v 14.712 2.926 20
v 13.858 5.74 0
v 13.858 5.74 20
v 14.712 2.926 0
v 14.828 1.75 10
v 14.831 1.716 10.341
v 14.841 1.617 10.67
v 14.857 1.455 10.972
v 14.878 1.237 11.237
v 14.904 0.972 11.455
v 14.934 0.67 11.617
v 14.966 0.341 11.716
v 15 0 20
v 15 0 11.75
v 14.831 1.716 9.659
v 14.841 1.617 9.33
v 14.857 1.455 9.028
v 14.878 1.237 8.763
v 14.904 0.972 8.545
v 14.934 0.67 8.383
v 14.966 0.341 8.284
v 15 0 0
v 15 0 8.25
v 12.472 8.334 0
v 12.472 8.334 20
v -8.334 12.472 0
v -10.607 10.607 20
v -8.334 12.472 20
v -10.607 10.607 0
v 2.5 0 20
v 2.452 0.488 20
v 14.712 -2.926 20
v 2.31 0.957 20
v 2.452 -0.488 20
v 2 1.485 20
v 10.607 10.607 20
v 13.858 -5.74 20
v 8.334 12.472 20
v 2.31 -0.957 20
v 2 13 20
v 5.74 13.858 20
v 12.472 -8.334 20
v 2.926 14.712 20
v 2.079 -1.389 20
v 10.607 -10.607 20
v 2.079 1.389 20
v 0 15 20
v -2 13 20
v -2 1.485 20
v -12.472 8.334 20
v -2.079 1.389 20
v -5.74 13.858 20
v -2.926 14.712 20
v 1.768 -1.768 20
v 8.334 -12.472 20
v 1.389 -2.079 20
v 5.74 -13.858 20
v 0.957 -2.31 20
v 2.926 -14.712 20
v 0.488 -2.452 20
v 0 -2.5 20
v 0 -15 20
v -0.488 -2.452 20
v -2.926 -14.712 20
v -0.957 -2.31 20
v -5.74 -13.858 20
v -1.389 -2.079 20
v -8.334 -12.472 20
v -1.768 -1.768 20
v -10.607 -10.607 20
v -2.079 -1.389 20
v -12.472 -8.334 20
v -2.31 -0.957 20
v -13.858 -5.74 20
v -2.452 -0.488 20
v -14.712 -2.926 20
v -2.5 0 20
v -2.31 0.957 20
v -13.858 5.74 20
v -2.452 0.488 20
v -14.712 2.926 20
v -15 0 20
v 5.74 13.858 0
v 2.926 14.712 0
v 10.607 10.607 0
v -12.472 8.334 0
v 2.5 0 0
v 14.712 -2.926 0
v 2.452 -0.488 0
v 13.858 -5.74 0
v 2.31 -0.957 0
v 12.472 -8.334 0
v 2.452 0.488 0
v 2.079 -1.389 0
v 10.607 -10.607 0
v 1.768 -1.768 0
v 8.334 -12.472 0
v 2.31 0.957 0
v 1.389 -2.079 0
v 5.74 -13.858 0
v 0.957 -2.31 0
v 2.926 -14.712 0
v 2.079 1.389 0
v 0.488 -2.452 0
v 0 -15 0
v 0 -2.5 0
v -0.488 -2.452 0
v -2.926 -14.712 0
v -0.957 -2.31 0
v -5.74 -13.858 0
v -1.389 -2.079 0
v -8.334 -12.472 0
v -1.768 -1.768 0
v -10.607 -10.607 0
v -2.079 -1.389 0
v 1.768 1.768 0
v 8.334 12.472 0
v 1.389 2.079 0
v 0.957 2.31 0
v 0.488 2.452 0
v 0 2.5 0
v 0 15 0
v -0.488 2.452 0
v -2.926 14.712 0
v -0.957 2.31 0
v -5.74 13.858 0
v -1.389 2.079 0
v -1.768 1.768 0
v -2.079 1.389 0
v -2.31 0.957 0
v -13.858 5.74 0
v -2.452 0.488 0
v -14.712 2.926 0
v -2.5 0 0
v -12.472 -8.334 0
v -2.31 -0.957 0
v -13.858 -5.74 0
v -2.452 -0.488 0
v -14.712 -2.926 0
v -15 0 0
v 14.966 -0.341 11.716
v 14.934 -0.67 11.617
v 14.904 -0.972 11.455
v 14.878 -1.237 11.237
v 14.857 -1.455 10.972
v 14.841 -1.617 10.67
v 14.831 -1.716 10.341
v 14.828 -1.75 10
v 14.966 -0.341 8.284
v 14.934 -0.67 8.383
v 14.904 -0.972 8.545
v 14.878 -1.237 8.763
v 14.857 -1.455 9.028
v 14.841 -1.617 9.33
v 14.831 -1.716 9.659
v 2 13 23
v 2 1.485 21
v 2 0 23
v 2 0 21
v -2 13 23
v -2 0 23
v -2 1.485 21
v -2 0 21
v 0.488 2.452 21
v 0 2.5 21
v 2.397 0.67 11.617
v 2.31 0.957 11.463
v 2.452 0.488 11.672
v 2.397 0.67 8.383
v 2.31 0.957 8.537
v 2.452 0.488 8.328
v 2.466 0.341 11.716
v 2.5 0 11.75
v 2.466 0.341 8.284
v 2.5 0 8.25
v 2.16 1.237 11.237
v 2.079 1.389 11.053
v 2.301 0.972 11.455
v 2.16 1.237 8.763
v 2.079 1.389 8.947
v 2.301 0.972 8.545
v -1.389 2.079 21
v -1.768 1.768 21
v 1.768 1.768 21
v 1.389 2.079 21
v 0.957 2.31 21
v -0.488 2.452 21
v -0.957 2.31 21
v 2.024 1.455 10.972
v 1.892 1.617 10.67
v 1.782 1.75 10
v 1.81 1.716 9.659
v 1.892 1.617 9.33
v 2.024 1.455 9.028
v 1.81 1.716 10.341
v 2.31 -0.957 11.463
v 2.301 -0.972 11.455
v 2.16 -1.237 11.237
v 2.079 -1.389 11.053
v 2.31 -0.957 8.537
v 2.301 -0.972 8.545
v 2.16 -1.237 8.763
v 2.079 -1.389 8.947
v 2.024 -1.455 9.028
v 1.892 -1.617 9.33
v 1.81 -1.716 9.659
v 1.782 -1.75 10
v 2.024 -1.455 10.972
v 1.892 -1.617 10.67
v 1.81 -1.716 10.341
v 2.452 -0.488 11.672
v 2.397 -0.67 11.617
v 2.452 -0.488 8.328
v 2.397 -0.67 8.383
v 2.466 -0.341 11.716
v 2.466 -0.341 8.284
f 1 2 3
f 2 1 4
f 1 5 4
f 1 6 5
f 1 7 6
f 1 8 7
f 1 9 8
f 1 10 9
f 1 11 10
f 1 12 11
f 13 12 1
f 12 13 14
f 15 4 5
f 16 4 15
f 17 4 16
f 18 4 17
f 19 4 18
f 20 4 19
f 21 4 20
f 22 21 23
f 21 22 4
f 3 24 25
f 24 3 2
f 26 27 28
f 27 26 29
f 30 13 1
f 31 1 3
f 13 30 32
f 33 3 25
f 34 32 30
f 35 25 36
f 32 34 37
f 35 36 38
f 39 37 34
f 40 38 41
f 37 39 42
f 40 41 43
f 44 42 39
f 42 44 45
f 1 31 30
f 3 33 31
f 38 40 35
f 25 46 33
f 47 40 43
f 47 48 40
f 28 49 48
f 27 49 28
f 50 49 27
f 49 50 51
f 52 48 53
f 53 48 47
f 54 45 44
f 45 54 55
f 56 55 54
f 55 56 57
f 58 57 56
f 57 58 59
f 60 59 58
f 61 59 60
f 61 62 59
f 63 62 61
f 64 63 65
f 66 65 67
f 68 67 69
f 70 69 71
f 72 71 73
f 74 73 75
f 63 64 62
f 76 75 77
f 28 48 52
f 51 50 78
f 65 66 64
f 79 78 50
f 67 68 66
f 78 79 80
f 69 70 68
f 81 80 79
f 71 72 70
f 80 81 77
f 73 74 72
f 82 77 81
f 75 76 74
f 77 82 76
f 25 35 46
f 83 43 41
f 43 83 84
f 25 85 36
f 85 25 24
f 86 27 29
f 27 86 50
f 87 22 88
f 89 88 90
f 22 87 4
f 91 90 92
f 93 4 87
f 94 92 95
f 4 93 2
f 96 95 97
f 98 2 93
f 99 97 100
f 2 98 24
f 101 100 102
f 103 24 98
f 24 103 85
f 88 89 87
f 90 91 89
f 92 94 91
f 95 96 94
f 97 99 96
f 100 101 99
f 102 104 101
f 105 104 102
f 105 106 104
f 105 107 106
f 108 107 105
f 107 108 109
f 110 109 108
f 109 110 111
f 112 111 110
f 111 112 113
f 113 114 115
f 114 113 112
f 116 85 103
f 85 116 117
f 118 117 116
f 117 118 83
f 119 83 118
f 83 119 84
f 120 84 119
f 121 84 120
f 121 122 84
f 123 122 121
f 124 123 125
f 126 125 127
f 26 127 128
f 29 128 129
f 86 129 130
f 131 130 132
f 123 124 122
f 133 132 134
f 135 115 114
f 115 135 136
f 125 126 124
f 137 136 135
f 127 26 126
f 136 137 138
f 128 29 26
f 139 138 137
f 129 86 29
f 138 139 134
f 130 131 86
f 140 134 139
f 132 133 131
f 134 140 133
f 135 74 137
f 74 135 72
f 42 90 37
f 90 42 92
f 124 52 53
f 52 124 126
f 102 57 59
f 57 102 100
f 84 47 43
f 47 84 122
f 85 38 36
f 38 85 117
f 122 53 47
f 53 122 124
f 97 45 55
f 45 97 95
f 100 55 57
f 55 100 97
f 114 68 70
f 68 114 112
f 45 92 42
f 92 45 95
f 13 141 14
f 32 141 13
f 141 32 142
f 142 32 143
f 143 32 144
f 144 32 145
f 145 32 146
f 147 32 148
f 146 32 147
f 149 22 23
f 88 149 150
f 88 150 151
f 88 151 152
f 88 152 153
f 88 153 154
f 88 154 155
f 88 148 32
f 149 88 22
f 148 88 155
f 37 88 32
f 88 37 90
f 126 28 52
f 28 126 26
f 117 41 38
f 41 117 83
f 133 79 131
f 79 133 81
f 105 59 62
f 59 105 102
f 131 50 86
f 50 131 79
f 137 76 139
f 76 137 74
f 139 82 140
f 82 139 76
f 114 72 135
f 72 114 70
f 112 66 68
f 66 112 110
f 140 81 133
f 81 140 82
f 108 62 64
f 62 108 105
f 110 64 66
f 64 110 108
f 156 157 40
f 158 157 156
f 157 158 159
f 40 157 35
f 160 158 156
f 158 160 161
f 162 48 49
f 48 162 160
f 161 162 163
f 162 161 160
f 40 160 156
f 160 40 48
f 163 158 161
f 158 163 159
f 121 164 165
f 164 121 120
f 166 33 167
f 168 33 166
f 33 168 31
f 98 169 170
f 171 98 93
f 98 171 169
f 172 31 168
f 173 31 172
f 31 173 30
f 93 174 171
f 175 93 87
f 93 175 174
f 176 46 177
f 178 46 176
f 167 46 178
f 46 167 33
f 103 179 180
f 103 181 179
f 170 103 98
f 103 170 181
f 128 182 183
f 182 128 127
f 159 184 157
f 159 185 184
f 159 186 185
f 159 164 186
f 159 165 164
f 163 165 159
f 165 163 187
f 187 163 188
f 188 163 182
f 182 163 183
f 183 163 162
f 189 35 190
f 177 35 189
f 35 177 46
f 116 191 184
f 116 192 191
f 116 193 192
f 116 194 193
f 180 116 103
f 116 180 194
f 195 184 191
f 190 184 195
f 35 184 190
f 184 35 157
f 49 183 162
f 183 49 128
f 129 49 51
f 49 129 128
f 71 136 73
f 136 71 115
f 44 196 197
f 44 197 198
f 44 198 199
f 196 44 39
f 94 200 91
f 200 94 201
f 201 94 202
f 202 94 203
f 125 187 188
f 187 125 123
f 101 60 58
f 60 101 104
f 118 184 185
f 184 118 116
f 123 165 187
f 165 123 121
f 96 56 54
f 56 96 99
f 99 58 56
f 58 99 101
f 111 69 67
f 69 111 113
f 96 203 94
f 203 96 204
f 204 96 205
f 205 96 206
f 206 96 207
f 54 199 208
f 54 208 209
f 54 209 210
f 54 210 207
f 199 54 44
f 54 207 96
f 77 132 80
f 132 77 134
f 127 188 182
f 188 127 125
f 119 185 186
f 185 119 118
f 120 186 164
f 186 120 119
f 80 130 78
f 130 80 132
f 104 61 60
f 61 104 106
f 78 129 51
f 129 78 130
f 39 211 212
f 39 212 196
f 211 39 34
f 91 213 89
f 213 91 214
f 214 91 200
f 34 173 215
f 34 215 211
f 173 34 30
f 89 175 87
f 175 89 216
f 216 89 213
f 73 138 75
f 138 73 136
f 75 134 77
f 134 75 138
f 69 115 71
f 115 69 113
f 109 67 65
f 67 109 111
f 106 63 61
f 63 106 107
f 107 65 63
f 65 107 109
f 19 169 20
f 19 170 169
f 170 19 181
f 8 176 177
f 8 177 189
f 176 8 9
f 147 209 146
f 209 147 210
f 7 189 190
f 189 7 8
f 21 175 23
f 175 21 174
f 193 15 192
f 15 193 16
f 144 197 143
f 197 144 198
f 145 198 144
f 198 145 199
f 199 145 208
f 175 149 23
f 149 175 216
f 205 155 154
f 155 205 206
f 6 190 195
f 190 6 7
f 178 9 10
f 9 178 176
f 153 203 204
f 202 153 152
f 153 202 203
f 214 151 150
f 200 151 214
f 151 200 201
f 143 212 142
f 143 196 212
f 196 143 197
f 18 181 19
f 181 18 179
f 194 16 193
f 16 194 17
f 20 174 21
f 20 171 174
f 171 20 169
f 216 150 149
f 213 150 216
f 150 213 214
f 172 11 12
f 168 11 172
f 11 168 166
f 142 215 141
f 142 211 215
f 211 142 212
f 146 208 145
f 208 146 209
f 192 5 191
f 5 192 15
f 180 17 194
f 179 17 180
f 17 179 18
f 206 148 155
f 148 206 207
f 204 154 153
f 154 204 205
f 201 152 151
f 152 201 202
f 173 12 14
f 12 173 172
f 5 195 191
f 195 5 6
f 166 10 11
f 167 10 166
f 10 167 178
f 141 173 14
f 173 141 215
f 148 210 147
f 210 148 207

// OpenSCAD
$fn = 32;

// ----------------------------------------------------------------------
// Control knob: pointer knob
// ----------------------------------------------------------------------

// --- parameters (mm) ---
rib_w = 4;                // pointer rib width
rib_h = 4;                // pointer rib height
knob_d = 30;              // knob body diameter
knob_h = 20;              // knob body height
bore_d = 5;               // shaft bore diameter
set_d = 3.5;              // set screw bore diameter

rib_poke = rib_h - 1;  // rib height above the top
total_h = knob_h + rib_h - 1;  // overall height

difference() {
  union() {
    cylinder(h = knob_h, d = knob_d);
    translate([-rib_w / 2, 0, knob_h - 1])
      cube([rib_w, knob_d / 2 - 2, rib_h]);
  }
  translate([0, 0, -1]) cylinder(h = knob_h + 2, d = bore_d);
  translate([-1, 0, knob_h / 2]) rotate([0, 90, 0])
    cylinder(h = knob_d / 2 + bore_d / 2 + 2, d = set_d);}
